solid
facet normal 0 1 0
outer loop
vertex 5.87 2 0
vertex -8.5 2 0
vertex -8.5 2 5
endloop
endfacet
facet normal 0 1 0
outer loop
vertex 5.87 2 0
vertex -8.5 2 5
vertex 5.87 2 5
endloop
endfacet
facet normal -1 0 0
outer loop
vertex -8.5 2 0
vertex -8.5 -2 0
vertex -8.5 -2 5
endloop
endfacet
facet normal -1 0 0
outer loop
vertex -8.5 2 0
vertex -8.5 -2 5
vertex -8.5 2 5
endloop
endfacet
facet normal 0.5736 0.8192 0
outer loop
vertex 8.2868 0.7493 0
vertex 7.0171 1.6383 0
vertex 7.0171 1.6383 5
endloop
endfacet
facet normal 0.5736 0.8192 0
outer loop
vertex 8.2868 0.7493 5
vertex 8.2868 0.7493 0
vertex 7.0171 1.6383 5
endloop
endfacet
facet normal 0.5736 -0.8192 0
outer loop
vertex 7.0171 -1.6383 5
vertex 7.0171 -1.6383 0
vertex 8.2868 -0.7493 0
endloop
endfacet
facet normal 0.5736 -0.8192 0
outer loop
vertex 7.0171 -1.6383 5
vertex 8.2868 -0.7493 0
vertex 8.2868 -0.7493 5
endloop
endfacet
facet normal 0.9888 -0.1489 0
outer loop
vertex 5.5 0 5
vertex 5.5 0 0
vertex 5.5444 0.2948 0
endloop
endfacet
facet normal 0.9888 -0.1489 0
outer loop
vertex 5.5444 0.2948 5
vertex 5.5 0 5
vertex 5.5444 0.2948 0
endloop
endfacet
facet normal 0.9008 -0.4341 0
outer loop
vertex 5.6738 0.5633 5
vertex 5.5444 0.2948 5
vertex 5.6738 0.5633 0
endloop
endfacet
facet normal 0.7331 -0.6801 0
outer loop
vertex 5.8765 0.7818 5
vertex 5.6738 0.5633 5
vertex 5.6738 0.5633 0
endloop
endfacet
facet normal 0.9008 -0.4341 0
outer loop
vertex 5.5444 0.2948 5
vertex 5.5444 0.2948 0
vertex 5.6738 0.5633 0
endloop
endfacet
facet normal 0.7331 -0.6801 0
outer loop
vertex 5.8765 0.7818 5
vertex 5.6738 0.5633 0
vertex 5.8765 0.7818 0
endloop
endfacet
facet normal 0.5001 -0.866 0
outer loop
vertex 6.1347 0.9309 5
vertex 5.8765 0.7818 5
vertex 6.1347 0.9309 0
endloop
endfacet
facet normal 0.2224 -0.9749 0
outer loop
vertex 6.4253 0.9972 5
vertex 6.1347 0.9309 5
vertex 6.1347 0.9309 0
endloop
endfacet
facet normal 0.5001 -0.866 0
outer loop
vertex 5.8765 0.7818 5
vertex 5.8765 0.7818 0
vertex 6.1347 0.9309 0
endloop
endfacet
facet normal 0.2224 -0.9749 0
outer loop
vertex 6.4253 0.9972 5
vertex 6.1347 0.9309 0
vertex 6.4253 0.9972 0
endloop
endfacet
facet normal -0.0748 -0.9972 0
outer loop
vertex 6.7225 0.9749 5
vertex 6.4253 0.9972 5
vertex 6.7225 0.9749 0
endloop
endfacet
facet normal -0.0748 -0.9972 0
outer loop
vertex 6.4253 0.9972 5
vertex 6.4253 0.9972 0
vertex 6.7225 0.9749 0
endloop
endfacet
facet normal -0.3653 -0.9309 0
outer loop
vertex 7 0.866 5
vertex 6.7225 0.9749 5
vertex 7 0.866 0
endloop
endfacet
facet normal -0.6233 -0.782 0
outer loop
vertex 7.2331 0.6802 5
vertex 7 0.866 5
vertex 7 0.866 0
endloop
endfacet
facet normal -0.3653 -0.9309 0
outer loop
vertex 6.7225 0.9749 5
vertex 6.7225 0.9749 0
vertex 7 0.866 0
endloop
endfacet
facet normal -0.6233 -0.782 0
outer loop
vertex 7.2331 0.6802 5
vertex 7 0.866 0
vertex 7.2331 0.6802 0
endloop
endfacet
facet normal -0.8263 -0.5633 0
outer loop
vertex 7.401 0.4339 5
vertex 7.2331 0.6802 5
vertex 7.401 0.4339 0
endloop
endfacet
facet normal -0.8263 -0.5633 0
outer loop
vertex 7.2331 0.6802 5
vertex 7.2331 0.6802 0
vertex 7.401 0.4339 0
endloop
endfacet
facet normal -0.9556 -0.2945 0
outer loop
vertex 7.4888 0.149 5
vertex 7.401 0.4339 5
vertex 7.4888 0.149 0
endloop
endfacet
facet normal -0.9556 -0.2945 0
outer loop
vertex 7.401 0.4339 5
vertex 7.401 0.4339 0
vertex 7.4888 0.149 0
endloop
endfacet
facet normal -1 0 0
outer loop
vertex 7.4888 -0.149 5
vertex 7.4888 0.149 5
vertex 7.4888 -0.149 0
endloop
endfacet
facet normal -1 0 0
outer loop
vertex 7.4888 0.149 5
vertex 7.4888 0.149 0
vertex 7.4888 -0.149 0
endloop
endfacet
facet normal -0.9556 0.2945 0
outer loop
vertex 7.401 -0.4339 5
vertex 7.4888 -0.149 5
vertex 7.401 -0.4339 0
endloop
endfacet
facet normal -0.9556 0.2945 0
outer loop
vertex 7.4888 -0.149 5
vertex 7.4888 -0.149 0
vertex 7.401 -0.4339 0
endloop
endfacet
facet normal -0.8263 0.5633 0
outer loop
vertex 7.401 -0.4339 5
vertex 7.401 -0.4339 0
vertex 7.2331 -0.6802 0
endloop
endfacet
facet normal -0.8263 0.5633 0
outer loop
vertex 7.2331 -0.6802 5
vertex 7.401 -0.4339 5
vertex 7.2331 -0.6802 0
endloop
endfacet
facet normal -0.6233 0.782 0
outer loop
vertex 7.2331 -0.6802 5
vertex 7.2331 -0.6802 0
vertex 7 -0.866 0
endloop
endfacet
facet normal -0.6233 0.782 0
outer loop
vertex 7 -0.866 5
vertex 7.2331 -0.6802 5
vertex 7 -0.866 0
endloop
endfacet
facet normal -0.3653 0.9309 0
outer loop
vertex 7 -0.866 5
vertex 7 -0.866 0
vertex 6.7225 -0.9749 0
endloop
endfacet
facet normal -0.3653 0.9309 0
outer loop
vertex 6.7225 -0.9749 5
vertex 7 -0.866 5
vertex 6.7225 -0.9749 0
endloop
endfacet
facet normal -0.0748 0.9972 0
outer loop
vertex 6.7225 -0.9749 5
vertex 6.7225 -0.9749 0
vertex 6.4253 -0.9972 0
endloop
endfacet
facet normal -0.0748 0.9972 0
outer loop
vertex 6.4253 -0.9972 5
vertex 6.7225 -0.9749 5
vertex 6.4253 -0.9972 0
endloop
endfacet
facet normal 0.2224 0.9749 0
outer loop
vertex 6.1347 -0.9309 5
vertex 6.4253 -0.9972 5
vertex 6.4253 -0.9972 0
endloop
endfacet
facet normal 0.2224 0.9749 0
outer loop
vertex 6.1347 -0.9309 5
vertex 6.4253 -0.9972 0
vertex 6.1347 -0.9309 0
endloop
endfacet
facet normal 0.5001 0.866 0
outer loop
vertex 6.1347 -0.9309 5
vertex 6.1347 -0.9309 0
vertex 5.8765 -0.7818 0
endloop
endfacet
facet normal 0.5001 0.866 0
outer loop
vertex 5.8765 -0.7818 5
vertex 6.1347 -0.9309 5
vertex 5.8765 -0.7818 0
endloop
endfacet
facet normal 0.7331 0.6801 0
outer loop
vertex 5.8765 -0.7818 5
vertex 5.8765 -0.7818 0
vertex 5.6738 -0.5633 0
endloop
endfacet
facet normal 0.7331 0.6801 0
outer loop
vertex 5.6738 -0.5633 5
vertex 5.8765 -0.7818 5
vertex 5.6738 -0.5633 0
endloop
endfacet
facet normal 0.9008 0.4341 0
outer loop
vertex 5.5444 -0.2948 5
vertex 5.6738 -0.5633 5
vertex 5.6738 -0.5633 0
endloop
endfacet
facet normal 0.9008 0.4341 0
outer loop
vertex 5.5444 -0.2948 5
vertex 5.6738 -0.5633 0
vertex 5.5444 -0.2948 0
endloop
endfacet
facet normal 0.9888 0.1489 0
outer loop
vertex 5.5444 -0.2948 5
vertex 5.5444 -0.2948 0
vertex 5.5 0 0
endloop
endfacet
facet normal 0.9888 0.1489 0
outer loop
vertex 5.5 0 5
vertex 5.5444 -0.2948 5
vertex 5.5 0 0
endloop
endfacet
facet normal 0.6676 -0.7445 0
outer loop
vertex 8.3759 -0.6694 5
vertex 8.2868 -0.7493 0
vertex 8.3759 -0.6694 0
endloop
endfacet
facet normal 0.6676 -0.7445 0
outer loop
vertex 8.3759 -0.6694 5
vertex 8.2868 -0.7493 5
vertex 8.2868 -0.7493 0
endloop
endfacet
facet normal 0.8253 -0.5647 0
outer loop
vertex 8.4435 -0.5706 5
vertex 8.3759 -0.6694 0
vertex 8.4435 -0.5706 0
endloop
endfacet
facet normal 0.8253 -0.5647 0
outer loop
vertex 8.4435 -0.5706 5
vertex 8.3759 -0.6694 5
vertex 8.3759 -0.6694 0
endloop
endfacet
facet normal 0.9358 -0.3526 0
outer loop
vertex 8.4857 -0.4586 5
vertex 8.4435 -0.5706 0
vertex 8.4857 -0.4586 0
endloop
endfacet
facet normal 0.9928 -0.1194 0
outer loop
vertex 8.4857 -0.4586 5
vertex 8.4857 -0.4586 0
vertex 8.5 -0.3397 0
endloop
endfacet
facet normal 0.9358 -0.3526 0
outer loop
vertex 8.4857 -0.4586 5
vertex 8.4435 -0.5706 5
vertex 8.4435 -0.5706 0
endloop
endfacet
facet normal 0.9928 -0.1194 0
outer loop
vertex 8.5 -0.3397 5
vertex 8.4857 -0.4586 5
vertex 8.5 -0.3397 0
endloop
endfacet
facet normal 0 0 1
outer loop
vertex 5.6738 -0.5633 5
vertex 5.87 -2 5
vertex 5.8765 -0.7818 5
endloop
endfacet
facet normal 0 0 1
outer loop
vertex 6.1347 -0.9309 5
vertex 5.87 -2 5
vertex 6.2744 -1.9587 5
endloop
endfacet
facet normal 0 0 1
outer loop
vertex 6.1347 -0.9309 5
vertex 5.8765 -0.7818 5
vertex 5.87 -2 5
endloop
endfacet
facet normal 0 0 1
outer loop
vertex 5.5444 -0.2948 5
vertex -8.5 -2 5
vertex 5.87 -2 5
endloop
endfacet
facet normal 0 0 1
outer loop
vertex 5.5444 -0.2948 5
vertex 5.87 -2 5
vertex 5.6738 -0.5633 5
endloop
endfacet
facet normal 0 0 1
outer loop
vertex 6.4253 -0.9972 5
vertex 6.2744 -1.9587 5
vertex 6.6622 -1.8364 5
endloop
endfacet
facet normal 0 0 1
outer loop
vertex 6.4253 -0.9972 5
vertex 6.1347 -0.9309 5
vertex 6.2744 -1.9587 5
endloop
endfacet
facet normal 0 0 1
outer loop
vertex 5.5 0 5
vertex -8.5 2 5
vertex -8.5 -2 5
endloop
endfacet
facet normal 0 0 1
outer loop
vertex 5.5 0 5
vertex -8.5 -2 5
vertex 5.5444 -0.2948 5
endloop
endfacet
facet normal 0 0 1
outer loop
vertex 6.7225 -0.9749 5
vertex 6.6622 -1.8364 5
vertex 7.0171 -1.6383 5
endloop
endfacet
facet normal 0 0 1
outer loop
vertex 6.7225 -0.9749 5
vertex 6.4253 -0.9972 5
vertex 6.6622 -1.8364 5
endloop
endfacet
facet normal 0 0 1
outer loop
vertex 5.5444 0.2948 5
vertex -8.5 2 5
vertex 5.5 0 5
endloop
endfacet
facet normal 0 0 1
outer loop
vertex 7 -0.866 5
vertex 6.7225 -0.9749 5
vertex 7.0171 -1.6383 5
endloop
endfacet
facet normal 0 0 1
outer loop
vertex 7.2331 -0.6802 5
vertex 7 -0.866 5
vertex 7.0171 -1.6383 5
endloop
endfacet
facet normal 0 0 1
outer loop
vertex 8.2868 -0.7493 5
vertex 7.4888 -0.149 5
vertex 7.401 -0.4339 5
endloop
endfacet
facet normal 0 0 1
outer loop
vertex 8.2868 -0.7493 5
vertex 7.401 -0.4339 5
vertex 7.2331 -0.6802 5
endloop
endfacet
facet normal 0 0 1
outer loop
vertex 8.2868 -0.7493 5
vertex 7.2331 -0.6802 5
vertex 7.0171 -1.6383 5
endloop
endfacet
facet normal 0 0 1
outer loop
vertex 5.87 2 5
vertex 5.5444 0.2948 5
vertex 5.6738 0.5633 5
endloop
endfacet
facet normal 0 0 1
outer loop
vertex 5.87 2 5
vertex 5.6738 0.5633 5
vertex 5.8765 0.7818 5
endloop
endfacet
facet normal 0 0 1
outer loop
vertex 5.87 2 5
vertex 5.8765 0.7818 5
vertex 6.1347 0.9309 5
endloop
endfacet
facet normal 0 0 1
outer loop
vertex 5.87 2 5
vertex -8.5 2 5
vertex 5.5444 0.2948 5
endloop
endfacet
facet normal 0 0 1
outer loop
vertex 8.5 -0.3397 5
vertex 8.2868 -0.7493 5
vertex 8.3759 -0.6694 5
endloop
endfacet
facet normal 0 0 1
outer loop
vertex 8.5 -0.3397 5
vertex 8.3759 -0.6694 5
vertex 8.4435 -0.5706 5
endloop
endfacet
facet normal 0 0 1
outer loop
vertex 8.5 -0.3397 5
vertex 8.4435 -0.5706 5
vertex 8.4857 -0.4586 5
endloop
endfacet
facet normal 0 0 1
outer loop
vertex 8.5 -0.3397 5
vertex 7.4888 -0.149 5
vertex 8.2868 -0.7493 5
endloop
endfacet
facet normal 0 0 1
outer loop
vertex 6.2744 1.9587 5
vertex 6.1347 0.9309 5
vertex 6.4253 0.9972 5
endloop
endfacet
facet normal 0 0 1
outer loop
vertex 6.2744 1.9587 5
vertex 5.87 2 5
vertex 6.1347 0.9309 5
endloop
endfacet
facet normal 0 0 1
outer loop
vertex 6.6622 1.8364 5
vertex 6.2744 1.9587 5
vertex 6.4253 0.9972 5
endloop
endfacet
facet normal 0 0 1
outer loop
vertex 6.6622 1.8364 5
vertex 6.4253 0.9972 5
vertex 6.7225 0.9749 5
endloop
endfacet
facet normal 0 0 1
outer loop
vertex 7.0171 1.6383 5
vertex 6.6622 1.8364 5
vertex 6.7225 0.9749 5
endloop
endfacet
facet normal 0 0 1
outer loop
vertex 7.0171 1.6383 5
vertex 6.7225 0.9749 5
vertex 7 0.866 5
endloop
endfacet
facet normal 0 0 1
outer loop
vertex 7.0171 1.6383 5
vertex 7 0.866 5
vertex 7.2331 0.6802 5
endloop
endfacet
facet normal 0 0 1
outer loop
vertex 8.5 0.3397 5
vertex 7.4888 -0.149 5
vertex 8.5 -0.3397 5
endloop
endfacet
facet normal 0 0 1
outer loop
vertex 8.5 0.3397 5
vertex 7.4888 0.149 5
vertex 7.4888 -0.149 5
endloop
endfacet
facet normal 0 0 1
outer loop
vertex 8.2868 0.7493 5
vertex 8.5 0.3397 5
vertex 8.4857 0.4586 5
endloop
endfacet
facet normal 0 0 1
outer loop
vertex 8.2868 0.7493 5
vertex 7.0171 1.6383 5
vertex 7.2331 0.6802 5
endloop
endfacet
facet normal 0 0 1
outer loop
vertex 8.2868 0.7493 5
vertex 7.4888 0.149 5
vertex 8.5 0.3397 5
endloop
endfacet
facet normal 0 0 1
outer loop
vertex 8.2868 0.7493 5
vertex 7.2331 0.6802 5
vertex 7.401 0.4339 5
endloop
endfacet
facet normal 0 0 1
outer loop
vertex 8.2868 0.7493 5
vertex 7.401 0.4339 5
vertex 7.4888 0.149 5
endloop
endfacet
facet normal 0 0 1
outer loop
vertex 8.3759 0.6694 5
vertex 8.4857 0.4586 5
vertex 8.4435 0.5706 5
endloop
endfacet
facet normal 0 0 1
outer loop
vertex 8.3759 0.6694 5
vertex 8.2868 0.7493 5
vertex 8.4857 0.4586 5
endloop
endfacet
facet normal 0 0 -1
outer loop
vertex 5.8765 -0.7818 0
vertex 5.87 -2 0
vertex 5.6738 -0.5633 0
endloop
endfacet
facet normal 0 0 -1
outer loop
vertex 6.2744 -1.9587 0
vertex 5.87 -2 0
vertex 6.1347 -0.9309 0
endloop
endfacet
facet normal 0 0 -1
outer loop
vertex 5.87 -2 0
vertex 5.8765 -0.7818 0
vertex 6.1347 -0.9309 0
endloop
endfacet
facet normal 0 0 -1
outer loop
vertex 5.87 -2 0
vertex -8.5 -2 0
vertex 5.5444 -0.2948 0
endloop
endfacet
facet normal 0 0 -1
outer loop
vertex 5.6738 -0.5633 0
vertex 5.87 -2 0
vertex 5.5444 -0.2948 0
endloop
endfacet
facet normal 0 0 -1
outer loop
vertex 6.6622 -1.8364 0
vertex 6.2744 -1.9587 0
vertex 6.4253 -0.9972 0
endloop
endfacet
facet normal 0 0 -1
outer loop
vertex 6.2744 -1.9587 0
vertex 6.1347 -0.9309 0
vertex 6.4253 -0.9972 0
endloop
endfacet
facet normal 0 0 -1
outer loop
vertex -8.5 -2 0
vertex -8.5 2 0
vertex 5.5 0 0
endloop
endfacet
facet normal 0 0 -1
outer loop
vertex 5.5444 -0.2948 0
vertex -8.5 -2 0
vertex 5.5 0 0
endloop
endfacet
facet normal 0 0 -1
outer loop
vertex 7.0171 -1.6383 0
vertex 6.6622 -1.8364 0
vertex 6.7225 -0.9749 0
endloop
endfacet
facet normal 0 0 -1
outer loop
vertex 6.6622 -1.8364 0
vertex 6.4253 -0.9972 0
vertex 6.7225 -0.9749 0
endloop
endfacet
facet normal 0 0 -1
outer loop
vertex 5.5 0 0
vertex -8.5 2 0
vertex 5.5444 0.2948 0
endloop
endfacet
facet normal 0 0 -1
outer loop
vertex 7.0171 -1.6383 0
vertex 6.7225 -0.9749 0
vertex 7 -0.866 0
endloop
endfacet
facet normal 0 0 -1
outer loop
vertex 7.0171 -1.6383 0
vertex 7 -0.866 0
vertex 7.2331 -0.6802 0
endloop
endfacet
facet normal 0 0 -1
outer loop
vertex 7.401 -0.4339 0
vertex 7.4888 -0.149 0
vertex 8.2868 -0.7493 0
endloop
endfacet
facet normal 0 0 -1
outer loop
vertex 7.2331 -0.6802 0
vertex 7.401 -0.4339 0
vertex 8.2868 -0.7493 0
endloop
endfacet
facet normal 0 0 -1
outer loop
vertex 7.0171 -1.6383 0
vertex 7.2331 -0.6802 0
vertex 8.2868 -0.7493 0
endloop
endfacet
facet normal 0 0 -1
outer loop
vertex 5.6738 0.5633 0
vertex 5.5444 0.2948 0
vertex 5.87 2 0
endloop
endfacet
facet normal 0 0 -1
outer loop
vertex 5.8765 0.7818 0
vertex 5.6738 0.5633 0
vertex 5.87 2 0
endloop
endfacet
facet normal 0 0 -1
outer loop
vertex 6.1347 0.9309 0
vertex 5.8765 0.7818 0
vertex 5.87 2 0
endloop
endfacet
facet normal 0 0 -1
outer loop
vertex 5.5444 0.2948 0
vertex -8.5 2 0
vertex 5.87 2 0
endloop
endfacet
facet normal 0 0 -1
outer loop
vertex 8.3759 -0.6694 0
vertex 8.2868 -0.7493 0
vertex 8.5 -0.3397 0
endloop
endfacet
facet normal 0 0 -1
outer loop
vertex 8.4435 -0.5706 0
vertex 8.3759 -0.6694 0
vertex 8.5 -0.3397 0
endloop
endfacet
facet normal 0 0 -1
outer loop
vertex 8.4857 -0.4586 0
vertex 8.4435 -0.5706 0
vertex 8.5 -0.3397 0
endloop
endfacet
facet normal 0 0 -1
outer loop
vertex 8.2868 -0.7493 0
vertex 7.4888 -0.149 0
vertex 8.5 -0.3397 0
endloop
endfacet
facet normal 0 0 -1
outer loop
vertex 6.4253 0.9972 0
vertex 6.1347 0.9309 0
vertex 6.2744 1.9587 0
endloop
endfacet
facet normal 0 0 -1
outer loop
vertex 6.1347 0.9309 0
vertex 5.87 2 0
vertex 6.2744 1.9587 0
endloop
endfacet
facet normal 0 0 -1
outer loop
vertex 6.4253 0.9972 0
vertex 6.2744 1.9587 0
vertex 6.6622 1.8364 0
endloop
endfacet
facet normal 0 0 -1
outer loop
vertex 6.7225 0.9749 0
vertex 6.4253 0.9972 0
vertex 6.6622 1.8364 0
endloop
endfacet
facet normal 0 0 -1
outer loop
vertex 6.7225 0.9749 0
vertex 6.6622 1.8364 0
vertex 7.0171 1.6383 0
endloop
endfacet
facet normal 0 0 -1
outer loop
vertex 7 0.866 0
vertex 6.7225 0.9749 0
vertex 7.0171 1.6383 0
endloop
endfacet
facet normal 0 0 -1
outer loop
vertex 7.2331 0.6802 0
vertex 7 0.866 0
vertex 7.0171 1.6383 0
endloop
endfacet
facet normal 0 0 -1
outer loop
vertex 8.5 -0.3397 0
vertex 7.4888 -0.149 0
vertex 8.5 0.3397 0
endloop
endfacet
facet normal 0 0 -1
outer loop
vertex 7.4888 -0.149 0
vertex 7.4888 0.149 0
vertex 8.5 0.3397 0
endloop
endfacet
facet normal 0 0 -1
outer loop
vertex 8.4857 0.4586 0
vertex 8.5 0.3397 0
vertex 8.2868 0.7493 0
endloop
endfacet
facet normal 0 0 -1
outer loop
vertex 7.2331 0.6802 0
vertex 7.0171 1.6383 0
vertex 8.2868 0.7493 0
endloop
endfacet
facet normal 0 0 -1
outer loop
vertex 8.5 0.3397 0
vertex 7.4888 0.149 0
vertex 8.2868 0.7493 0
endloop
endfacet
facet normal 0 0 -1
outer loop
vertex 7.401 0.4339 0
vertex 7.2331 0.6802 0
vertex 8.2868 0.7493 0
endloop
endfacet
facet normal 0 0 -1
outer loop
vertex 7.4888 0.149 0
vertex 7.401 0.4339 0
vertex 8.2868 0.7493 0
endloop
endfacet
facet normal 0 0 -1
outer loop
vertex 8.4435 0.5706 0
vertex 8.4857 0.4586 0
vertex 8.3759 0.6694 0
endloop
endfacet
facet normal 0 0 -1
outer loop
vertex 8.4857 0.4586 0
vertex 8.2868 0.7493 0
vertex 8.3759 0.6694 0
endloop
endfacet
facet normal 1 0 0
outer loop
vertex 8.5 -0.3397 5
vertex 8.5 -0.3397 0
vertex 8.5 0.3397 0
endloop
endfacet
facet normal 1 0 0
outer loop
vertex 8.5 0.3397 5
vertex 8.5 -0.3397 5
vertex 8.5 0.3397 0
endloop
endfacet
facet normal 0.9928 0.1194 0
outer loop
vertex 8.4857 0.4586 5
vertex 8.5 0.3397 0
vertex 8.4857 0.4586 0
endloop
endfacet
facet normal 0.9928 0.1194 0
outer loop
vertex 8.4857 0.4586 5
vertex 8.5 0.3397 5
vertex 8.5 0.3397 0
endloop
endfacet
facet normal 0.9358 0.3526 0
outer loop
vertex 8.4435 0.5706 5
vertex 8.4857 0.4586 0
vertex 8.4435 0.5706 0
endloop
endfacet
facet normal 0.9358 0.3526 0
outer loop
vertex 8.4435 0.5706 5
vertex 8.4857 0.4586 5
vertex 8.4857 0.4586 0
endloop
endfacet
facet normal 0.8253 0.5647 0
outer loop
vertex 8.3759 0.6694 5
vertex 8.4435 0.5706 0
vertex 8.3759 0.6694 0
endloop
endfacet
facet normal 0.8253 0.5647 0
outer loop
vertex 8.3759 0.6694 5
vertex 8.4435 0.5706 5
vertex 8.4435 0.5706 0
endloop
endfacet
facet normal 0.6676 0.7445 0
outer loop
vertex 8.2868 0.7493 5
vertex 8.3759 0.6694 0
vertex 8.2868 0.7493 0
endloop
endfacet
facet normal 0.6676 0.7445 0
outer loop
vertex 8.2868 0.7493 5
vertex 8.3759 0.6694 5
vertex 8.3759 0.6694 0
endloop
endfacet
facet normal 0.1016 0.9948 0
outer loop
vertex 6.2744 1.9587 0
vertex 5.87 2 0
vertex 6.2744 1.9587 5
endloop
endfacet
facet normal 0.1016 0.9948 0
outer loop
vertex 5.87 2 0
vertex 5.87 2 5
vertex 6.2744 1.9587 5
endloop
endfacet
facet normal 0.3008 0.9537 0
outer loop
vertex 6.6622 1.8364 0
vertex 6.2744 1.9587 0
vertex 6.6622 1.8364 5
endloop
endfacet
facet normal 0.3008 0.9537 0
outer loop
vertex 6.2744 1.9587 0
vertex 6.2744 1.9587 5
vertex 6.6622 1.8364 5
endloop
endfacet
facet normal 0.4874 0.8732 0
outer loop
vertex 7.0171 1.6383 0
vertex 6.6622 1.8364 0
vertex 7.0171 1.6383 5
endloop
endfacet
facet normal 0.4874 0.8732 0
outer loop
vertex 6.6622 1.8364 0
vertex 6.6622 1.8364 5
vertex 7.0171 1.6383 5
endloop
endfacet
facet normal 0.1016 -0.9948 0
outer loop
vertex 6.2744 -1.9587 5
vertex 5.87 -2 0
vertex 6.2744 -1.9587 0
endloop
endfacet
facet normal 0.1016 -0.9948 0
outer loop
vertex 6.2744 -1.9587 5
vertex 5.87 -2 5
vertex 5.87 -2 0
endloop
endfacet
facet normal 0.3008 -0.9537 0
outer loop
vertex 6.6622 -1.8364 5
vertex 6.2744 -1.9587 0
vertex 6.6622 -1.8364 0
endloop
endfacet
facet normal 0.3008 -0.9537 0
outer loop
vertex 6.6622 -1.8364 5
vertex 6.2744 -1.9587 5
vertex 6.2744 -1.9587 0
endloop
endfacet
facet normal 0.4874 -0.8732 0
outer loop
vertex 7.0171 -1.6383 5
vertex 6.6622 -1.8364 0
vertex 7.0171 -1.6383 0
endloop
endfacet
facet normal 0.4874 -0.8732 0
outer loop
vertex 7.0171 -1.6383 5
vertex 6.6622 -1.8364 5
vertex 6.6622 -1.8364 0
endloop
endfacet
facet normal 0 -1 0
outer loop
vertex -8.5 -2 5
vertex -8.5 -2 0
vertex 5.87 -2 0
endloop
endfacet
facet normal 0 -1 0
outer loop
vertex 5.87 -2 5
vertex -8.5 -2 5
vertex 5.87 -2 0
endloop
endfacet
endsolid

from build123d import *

# Parameters (mm, degrees)
F0_W     = 17
F0_H     = 4
F1_DEPTH = 5
F3_D     = 2
F4_SIZE2 = 1.9994072094
F4_SIZE  = 1.4
F5_R     = 2
F6_R     = 0.5


with BuildPart() as f1:
    # F0 (on Top) → F1 (new body)
    with BuildSketch(Plane.XY):
        Rectangle(F0_W, F0_H)
    extrude(amount=F1_DEPTH)

    # F3 (through all)
    with Locations(Plane.XY.offset(5)):
        with Locations((6.5, 0)):
            Hole(F3_D / 2)

    # F4
    f4_edges = [f1.edges().sort_by_distance(p)[0] for p in [
        (8.5, -2, 2.5),
        (8.5, 2, 2.5),
    ]]
    f4_side = f1.faces().sort_by_distance((8.5, 0, 2.5))[0]
    chamfer(f4_edges, length=F4_SIZE, length2=F4_SIZE2, reference=f4_side)

    # F5
    f5_edges = [f1.edges().sort_by_distance(p)[0] for p in [
        (6.500593, -2, 2.5),
        (6.500593, 2, 2.5),
    ]]
    fillet(f5_edges, radius=F5_R)

    # F6
    f6_edges = [f1.edges().sort_by_distance(p)[0] for p in [
        (8.5, 0.6, 2.5),
        (8.5, -0.6, 2.5),
    ]]
    fillet(f6_edges, radius=F6_R)


solid = f1.part
